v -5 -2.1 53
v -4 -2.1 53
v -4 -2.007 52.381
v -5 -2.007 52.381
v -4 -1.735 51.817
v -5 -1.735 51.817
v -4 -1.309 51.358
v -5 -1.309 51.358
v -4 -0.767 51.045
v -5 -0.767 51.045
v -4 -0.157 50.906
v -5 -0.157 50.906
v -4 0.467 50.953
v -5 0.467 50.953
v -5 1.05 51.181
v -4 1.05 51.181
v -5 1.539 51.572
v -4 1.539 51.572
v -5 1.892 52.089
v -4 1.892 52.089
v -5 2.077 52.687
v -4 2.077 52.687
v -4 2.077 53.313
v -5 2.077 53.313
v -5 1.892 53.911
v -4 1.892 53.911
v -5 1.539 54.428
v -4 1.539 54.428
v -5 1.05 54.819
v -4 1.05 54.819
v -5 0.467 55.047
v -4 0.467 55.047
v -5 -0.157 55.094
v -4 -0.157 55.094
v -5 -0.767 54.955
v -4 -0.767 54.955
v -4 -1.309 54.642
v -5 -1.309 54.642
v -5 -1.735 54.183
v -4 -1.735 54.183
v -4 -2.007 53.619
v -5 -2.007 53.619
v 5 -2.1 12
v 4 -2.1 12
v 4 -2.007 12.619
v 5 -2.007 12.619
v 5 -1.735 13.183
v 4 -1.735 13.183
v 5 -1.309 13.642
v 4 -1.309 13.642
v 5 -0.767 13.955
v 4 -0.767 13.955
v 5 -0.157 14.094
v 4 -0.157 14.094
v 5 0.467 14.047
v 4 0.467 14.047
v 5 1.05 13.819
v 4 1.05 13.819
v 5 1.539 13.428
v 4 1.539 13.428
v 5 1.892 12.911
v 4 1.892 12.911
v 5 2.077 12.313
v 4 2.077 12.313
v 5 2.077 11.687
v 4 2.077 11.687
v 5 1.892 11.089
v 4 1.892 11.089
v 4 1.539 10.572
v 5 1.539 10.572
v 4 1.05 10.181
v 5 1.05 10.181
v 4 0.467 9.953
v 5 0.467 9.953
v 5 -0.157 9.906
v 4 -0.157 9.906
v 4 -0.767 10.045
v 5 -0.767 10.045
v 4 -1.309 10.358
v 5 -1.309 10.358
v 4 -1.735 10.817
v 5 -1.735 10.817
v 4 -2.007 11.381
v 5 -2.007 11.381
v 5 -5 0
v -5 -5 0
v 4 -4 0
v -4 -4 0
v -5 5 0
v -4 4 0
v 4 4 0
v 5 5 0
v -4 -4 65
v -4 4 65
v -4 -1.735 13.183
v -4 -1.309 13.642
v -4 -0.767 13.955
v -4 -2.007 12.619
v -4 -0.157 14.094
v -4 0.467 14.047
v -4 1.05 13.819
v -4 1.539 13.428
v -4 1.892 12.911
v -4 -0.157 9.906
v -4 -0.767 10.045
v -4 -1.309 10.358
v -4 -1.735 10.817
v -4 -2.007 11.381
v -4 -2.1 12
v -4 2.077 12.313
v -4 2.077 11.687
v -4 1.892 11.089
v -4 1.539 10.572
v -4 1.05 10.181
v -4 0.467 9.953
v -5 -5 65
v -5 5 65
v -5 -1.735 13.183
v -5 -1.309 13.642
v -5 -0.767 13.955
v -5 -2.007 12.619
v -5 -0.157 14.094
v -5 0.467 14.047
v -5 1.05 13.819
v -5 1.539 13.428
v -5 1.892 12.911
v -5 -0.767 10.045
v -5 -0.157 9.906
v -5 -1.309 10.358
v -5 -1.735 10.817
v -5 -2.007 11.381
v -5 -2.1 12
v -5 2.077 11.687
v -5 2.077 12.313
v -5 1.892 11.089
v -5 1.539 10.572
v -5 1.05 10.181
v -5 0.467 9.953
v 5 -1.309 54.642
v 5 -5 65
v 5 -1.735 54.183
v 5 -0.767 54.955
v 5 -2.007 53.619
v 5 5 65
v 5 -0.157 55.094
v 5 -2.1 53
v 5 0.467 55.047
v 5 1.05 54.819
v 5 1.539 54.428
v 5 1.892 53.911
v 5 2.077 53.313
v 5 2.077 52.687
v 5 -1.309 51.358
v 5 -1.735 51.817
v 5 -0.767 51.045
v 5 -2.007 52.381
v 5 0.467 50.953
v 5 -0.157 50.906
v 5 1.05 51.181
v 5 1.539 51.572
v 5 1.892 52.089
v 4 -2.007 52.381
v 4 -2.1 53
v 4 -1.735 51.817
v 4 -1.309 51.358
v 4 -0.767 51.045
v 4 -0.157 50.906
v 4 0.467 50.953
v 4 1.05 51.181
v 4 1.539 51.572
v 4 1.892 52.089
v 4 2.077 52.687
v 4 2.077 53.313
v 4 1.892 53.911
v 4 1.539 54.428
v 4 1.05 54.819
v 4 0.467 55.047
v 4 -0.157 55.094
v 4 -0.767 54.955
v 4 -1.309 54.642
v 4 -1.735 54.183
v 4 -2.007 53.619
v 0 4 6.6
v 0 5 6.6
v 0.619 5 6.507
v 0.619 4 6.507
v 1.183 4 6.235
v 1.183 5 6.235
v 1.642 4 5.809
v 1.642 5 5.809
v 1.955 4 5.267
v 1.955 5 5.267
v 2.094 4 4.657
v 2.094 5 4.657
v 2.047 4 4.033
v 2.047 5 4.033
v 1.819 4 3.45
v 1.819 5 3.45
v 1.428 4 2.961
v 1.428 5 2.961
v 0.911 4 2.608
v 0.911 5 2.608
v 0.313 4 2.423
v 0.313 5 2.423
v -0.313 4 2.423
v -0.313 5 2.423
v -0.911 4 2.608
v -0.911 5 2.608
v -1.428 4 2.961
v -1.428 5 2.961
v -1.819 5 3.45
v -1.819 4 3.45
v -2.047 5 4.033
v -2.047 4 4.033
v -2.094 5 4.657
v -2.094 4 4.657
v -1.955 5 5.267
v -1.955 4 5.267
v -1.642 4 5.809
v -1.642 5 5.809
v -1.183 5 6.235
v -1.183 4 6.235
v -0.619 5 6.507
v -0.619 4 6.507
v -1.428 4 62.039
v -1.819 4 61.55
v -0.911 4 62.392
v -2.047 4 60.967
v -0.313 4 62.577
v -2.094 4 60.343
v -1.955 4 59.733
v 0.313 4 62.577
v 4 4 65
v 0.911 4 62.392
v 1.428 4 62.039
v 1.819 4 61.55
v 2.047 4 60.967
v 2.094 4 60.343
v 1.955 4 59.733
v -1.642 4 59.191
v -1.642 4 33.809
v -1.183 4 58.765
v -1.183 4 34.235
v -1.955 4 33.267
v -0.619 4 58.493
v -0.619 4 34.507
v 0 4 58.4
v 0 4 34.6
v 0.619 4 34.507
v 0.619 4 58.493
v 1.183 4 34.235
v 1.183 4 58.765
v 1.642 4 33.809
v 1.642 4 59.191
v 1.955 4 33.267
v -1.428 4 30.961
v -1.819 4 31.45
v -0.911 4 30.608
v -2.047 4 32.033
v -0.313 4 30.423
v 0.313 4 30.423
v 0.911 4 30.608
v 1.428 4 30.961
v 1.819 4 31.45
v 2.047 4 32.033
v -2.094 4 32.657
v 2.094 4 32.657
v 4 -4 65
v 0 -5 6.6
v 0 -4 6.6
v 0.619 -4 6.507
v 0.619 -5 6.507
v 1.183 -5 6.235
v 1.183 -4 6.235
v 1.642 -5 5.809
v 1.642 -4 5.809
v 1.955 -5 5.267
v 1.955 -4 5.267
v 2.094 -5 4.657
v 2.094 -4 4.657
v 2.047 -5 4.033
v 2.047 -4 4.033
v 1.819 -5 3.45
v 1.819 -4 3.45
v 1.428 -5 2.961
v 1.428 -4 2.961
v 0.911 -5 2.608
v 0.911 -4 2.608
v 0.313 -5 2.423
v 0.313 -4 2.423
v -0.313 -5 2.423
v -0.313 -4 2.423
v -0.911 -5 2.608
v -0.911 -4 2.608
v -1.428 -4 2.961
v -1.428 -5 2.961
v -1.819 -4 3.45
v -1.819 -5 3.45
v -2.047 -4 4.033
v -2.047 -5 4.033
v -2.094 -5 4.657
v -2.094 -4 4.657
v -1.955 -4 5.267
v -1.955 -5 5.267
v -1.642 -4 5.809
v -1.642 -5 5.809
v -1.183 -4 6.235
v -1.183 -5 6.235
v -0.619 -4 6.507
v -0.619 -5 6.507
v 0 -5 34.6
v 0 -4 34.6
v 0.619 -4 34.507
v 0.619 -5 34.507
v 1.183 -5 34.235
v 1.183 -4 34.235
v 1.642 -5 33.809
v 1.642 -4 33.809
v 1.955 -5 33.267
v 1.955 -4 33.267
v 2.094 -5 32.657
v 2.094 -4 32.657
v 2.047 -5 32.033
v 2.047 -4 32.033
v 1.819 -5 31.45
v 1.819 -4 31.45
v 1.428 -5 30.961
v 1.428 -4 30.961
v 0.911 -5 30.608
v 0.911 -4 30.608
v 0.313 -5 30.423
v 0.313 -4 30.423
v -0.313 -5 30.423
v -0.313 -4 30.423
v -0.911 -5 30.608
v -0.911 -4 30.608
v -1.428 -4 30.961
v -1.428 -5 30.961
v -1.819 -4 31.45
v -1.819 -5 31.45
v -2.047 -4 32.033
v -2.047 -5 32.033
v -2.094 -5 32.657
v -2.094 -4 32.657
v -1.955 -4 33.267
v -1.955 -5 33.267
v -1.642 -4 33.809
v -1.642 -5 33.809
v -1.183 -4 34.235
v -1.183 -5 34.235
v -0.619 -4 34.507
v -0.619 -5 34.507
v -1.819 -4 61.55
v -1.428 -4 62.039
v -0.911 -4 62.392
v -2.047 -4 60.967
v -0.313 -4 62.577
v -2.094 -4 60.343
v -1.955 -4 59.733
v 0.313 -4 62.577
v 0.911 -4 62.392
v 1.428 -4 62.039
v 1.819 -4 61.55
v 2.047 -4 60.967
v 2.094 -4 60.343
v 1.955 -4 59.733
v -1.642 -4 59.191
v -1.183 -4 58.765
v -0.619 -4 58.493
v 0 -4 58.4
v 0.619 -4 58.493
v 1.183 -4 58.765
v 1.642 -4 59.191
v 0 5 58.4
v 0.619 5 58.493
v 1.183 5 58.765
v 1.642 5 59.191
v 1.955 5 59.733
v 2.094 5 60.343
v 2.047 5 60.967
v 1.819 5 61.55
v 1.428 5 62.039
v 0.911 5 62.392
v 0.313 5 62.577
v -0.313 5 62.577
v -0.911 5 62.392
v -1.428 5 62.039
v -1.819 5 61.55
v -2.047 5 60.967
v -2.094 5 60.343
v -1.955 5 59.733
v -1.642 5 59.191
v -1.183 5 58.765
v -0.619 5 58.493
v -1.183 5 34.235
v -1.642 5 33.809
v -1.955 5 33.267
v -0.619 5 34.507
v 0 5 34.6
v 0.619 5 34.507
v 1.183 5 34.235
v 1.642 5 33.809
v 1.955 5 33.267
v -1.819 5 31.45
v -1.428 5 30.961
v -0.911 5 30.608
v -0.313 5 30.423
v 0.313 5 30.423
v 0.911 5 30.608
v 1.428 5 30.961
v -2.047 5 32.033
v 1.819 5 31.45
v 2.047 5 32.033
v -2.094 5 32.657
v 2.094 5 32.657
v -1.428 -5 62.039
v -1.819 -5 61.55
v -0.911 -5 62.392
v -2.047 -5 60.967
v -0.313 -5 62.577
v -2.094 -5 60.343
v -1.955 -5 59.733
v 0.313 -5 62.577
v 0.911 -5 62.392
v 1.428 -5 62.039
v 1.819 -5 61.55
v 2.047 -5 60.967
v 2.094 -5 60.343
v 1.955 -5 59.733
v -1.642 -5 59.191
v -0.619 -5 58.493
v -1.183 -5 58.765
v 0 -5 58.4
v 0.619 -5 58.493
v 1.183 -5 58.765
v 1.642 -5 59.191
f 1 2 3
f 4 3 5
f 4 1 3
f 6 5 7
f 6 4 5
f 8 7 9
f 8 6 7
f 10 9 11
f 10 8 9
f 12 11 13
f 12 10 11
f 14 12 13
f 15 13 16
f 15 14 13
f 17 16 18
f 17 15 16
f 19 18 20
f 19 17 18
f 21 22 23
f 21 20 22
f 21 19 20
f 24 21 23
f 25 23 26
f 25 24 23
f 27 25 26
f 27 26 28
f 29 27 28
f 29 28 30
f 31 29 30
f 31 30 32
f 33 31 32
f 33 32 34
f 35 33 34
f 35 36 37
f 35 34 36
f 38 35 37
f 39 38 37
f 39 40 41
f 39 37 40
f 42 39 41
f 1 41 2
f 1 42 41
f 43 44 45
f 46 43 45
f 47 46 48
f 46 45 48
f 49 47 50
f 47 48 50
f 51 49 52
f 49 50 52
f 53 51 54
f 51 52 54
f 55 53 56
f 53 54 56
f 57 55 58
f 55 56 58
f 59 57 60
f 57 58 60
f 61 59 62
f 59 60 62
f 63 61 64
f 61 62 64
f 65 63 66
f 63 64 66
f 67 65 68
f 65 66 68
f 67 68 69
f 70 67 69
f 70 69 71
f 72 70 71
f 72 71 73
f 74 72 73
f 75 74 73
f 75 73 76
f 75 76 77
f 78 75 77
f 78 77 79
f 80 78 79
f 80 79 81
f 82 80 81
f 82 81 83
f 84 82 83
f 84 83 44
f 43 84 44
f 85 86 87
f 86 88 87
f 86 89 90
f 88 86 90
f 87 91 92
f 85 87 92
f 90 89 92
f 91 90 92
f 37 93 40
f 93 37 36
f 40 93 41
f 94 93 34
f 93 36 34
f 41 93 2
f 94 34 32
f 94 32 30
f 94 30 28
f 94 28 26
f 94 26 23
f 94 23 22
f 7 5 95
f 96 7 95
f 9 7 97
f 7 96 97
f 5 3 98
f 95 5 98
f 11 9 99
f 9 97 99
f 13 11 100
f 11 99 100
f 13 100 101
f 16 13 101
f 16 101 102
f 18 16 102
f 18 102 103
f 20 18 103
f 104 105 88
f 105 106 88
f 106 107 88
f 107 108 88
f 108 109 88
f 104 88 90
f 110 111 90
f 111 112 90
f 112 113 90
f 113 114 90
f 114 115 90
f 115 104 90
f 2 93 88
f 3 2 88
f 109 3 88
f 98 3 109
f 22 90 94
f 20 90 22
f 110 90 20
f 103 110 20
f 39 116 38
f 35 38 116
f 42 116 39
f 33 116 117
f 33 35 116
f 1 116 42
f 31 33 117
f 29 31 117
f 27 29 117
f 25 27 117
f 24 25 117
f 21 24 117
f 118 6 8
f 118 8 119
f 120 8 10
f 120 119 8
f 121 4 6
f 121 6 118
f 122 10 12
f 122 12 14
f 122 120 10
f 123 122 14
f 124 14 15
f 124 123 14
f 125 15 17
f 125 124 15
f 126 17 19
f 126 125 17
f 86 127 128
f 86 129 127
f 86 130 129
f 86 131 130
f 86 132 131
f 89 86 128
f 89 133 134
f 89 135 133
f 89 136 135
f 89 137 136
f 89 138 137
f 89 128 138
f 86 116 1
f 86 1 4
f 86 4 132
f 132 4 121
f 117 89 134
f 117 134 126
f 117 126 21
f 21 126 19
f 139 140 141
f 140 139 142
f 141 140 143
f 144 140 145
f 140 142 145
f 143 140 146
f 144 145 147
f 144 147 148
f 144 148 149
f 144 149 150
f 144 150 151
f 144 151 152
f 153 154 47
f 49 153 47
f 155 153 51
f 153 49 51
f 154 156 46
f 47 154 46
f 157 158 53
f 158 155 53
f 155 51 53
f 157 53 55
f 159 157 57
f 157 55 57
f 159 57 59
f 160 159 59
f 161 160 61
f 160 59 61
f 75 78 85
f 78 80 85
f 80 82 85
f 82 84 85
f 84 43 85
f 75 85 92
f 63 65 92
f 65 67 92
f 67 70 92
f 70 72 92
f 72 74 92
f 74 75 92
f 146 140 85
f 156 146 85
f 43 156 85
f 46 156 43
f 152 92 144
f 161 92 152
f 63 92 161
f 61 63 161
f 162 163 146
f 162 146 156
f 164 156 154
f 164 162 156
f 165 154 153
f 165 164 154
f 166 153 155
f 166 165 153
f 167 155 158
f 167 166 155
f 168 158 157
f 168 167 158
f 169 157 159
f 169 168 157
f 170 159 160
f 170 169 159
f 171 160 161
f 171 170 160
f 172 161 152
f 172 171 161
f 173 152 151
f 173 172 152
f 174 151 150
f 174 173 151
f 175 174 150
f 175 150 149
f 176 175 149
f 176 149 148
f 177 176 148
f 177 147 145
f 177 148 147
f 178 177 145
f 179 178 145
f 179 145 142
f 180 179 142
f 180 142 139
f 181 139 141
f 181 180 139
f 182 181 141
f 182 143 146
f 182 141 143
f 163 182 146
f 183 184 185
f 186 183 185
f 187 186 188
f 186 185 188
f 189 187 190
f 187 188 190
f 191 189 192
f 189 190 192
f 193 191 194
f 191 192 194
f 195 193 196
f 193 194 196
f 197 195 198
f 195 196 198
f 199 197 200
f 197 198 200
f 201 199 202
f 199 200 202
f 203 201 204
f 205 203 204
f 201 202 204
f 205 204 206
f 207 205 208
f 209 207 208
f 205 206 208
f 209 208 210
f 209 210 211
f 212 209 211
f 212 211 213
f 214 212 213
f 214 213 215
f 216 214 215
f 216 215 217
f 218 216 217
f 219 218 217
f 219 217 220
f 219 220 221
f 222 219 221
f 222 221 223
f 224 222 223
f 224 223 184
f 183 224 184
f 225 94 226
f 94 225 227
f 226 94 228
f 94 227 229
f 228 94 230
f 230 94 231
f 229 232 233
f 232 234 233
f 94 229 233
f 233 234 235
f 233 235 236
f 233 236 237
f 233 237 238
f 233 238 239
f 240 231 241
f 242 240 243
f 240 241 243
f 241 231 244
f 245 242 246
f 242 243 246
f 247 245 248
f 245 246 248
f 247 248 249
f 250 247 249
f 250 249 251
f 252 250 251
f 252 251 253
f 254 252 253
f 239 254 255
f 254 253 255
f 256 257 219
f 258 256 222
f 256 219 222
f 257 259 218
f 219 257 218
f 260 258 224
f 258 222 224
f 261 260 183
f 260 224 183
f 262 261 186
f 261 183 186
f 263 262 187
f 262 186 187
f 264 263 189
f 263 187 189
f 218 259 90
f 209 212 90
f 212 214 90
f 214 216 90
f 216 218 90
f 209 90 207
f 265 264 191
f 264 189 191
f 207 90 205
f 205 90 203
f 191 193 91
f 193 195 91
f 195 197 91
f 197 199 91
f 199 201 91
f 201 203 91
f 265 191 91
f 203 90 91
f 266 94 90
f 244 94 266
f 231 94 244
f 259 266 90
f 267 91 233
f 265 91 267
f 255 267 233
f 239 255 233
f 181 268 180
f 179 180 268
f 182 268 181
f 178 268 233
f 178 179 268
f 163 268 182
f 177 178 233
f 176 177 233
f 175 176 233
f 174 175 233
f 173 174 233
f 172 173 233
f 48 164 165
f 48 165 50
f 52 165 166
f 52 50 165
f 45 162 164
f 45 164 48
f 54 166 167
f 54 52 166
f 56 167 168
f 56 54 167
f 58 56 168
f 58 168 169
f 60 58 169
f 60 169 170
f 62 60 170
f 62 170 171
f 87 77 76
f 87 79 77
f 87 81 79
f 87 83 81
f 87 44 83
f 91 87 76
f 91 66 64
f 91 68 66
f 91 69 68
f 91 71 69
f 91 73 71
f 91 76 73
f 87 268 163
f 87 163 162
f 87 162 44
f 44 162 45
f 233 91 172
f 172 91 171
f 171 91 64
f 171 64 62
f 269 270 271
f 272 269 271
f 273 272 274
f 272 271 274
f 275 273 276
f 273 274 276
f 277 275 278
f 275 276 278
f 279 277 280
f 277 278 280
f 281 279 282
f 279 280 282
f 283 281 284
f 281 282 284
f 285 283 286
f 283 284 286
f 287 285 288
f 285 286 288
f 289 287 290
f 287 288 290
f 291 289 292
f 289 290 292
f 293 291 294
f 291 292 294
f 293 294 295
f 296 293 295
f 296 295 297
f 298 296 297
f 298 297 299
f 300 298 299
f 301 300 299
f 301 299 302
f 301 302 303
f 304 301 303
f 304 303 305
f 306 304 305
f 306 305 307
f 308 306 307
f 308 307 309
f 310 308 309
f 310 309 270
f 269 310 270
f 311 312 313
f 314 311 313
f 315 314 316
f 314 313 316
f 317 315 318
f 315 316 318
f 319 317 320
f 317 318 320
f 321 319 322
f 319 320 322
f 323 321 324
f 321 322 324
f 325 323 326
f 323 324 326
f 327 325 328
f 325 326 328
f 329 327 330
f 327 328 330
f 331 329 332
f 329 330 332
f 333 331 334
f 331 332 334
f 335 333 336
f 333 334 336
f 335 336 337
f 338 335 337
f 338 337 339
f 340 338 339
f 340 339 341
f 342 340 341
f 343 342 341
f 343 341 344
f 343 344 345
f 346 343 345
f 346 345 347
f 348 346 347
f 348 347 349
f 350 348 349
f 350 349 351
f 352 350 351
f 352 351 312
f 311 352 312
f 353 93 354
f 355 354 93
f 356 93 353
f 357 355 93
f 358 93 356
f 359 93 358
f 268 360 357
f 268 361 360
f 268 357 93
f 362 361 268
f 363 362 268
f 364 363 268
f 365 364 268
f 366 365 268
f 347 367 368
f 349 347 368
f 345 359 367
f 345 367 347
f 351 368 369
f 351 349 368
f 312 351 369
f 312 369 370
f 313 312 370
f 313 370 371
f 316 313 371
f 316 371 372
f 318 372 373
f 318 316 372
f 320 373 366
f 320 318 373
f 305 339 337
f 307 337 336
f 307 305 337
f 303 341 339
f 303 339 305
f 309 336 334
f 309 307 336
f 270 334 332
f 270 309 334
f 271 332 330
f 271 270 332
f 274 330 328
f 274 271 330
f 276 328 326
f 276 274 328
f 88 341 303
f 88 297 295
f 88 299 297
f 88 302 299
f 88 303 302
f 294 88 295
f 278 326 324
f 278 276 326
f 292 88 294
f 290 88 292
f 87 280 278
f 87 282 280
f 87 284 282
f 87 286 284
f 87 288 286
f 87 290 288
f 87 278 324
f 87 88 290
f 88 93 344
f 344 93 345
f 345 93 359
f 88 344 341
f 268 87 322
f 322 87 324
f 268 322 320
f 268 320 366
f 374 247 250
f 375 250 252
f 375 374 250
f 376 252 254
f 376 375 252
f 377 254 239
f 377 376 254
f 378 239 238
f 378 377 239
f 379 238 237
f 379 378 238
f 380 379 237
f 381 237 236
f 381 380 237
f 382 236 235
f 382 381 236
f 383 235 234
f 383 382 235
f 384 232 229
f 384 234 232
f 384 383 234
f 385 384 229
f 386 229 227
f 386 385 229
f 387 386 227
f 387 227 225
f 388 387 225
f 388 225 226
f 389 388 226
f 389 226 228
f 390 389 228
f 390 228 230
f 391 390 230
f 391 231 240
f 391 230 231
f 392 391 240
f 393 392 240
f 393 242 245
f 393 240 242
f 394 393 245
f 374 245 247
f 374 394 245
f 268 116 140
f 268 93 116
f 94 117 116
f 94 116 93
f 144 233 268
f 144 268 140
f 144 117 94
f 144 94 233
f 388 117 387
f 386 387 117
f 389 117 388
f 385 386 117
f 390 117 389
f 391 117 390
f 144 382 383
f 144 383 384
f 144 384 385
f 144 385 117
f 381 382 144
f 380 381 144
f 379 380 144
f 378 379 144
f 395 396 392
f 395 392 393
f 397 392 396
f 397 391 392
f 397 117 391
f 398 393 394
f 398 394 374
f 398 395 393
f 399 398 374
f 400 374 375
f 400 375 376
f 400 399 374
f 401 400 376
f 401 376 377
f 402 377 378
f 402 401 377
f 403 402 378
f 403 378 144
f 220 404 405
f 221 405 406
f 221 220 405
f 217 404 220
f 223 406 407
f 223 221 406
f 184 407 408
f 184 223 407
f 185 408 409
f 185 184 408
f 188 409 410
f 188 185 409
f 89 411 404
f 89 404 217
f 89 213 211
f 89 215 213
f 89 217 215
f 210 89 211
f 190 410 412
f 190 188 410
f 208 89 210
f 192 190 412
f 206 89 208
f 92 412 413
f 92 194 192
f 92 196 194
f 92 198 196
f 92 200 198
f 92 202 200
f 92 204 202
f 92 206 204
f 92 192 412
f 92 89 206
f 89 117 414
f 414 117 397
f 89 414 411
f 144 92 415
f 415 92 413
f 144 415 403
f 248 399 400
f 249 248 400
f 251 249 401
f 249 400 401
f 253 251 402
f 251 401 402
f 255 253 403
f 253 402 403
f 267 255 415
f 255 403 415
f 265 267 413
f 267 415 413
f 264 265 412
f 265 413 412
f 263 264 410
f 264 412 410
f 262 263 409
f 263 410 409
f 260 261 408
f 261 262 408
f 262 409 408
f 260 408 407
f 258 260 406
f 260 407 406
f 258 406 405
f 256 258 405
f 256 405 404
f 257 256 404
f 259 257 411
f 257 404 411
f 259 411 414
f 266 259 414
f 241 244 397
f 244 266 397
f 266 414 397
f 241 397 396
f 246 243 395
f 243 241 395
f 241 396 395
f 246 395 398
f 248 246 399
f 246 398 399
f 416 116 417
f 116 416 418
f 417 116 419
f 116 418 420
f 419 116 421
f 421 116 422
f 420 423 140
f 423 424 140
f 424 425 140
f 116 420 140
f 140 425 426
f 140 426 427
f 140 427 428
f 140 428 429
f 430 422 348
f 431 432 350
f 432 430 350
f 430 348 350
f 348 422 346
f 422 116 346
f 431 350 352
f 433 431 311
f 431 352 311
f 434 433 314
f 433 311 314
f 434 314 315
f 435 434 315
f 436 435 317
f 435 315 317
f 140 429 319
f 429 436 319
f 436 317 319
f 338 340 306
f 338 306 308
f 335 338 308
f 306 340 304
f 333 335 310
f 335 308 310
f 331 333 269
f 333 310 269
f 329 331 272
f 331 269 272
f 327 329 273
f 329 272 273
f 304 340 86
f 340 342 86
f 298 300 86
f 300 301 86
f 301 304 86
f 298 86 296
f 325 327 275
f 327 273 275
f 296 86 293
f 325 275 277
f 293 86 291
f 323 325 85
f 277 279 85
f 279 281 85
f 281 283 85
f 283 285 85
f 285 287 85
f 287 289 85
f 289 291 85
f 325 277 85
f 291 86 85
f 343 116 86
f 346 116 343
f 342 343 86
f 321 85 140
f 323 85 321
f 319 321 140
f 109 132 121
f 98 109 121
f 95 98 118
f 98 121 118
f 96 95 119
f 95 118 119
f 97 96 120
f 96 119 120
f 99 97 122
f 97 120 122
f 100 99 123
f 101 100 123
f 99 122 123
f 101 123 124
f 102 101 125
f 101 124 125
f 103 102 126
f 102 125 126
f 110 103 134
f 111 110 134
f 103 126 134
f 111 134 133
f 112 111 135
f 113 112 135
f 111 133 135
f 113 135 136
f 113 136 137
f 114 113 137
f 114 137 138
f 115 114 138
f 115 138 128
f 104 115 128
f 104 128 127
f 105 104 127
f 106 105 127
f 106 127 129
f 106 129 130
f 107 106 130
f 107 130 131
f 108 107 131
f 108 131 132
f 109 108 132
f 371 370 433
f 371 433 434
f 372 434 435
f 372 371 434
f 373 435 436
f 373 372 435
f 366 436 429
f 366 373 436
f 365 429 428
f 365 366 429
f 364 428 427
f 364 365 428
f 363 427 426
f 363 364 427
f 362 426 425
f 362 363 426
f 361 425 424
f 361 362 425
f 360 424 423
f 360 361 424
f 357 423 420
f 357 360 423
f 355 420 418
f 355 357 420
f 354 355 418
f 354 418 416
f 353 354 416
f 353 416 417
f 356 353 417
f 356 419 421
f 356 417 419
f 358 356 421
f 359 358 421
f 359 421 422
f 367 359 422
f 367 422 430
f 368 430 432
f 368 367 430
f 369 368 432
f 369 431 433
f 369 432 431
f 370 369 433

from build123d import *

# Parameters (mm, degrees)
SKETCH_1_W          = 10
SKETCH_1_H          = 10
SKETCH_1_W_2        = 8
SKETCH_1_H_2        = 8
EXTRUDE_1_DEPTH     = 65
SKETCH_2_R          = 2.1
CUT_EXTRUDE_1_DEPTH = 60
SKETCH_3_R          = 2.1
CUT_EXTRUDE_2_DEPTH = 66.954529791


with BuildPart() as part:
    # 草图1 → 凸台-拉伸1 (new body)
    with BuildSketch(Plane.XY):
        Rectangle(SKETCH_1_W, SKETCH_1_H)
        Rectangle(SKETCH_1_W_2, SKETCH_1_H_2, mode=Mode.SUBTRACT)
    extrude(amount=EXTRUDE_1_DEPTH)

    # 草图2 → 切除-拉伸1 (cut)
    with BuildSketch(Plane(origin=(0, 5, 0), x_dir=(1, 0, 0), z_dir=(0, 1, 0))):
        with Locations(Location((0, -4.5, 0), (0, 0, 270))):
            Circle(SKETCH_2_R)
        with Locations(Location((0, -32.5, 0), (0, 0, 270))):
            Circle(SKETCH_2_R)
    cut_extrude_1 = extrude(amount=-CUT_EXTRUDE_1_DEPTH, mode=Mode.SUBTRACT)

    # 镜向1: 切除-拉伸1 across plane
    add(cut_extrude_1.mirror(Plane(origin=(0, 0, 32.5), x_dir=(1, 0, 0), z_dir=(0, 0, -1))), mode=Mode.SUBTRACT)

    # 草图3 → 切除-拉伸2 (cut, through all)
    with BuildSketch(Plane.ZY.offset(5)):
        with Locations(Location((12, 0, 0), (0, 0, 270))):
            Circle(SKETCH_3_R)
    cut_extrude_2 = extrude(amount=-CUT_EXTRUDE_2_DEPTH, mode=Mode.SUBTRACT)

    # 镜向2: 切除-拉伸2 across plane
    add(cut_extrude_2.mirror(Plane(origin=(0, 0, 32.5), x_dir=(1, 0, 0), z_dir=(0, 0, -1))), mode=Mode.SUBTRACT)


solid = part.part
